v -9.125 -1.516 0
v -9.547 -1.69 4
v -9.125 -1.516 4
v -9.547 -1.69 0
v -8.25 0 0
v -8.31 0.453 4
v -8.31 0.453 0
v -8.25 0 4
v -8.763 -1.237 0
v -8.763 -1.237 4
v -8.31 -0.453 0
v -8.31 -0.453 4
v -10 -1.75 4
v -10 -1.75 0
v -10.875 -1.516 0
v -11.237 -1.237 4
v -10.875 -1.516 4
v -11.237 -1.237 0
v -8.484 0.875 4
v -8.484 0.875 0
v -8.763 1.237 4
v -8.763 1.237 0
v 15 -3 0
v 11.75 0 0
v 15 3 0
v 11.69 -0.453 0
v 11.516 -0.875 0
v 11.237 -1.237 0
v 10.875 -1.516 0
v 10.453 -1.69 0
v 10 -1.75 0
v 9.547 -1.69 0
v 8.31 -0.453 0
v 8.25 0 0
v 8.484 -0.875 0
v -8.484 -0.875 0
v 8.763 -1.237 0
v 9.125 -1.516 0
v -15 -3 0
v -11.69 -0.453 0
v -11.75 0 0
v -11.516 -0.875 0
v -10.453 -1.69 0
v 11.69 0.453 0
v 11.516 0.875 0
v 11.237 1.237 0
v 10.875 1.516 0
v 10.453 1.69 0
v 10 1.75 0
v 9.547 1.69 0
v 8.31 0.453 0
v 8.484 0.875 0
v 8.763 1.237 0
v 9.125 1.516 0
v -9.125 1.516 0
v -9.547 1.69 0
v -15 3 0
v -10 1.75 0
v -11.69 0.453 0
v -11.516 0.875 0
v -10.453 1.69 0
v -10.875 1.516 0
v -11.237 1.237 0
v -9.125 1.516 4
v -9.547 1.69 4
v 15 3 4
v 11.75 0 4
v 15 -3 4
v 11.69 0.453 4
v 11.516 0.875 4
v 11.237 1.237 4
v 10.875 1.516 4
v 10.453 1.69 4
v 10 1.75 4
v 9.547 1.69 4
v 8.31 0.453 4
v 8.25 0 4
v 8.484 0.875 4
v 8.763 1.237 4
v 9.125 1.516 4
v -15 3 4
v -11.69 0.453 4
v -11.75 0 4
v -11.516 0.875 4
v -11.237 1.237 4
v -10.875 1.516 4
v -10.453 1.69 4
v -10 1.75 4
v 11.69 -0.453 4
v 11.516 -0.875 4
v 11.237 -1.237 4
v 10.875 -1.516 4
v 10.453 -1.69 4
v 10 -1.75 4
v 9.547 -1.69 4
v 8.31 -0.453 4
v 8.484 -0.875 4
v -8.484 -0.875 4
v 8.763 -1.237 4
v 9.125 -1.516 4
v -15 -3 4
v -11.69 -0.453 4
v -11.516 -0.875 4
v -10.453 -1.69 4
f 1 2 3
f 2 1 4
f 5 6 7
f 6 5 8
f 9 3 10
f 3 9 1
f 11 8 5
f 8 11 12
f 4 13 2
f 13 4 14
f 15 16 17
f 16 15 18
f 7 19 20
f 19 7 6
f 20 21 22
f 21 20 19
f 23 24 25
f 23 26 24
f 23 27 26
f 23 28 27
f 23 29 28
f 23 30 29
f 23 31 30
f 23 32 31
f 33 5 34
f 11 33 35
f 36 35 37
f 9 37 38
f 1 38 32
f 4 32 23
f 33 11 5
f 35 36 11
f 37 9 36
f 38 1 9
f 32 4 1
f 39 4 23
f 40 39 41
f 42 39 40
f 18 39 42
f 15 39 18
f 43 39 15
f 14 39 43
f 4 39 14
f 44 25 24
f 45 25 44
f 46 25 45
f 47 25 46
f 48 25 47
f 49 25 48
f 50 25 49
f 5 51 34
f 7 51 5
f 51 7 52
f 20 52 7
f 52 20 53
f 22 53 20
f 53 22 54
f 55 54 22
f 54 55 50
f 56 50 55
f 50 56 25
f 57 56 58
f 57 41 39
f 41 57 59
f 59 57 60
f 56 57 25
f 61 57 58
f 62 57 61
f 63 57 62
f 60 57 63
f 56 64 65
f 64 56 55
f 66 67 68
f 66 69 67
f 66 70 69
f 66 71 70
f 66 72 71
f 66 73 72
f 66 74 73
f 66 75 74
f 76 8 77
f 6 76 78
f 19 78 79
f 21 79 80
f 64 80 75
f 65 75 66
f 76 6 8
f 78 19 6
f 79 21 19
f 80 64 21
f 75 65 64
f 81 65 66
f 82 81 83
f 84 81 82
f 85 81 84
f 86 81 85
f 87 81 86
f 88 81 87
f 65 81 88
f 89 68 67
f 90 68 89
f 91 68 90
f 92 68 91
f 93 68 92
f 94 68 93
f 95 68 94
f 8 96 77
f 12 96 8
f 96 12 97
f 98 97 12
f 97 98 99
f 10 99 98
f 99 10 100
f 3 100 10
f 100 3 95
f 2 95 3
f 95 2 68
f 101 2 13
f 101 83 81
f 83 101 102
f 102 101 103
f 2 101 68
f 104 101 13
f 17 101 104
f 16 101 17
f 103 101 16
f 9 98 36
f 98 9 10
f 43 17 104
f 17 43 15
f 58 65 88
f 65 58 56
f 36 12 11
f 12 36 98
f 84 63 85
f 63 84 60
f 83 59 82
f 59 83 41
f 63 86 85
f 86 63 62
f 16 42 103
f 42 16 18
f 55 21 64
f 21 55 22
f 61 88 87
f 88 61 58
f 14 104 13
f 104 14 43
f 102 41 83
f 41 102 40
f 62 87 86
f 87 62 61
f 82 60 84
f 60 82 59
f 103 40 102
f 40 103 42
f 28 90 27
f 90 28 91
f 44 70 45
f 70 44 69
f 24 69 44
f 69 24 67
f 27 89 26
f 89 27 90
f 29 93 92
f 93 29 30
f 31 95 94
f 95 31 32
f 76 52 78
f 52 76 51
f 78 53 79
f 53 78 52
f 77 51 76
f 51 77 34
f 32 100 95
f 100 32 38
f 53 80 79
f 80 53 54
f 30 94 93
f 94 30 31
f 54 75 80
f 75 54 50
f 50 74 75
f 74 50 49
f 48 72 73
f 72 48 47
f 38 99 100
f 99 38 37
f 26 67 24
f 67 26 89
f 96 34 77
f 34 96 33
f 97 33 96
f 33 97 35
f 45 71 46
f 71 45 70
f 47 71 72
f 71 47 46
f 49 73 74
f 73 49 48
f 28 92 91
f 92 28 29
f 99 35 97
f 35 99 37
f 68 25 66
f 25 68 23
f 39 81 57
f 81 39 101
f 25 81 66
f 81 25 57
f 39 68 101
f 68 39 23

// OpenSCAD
difference()
{
    union()
    {
        translate([-15,-3,0])
            cube([30,6,4]);
    }
    union()
    {
        translate([-10,0,0])
            cylinder(d=3.5,h=4,$fn=24);
        
        translate([10,0,0])
            cylinder(d=3.5,h=4,$fn=24);
    }
}
